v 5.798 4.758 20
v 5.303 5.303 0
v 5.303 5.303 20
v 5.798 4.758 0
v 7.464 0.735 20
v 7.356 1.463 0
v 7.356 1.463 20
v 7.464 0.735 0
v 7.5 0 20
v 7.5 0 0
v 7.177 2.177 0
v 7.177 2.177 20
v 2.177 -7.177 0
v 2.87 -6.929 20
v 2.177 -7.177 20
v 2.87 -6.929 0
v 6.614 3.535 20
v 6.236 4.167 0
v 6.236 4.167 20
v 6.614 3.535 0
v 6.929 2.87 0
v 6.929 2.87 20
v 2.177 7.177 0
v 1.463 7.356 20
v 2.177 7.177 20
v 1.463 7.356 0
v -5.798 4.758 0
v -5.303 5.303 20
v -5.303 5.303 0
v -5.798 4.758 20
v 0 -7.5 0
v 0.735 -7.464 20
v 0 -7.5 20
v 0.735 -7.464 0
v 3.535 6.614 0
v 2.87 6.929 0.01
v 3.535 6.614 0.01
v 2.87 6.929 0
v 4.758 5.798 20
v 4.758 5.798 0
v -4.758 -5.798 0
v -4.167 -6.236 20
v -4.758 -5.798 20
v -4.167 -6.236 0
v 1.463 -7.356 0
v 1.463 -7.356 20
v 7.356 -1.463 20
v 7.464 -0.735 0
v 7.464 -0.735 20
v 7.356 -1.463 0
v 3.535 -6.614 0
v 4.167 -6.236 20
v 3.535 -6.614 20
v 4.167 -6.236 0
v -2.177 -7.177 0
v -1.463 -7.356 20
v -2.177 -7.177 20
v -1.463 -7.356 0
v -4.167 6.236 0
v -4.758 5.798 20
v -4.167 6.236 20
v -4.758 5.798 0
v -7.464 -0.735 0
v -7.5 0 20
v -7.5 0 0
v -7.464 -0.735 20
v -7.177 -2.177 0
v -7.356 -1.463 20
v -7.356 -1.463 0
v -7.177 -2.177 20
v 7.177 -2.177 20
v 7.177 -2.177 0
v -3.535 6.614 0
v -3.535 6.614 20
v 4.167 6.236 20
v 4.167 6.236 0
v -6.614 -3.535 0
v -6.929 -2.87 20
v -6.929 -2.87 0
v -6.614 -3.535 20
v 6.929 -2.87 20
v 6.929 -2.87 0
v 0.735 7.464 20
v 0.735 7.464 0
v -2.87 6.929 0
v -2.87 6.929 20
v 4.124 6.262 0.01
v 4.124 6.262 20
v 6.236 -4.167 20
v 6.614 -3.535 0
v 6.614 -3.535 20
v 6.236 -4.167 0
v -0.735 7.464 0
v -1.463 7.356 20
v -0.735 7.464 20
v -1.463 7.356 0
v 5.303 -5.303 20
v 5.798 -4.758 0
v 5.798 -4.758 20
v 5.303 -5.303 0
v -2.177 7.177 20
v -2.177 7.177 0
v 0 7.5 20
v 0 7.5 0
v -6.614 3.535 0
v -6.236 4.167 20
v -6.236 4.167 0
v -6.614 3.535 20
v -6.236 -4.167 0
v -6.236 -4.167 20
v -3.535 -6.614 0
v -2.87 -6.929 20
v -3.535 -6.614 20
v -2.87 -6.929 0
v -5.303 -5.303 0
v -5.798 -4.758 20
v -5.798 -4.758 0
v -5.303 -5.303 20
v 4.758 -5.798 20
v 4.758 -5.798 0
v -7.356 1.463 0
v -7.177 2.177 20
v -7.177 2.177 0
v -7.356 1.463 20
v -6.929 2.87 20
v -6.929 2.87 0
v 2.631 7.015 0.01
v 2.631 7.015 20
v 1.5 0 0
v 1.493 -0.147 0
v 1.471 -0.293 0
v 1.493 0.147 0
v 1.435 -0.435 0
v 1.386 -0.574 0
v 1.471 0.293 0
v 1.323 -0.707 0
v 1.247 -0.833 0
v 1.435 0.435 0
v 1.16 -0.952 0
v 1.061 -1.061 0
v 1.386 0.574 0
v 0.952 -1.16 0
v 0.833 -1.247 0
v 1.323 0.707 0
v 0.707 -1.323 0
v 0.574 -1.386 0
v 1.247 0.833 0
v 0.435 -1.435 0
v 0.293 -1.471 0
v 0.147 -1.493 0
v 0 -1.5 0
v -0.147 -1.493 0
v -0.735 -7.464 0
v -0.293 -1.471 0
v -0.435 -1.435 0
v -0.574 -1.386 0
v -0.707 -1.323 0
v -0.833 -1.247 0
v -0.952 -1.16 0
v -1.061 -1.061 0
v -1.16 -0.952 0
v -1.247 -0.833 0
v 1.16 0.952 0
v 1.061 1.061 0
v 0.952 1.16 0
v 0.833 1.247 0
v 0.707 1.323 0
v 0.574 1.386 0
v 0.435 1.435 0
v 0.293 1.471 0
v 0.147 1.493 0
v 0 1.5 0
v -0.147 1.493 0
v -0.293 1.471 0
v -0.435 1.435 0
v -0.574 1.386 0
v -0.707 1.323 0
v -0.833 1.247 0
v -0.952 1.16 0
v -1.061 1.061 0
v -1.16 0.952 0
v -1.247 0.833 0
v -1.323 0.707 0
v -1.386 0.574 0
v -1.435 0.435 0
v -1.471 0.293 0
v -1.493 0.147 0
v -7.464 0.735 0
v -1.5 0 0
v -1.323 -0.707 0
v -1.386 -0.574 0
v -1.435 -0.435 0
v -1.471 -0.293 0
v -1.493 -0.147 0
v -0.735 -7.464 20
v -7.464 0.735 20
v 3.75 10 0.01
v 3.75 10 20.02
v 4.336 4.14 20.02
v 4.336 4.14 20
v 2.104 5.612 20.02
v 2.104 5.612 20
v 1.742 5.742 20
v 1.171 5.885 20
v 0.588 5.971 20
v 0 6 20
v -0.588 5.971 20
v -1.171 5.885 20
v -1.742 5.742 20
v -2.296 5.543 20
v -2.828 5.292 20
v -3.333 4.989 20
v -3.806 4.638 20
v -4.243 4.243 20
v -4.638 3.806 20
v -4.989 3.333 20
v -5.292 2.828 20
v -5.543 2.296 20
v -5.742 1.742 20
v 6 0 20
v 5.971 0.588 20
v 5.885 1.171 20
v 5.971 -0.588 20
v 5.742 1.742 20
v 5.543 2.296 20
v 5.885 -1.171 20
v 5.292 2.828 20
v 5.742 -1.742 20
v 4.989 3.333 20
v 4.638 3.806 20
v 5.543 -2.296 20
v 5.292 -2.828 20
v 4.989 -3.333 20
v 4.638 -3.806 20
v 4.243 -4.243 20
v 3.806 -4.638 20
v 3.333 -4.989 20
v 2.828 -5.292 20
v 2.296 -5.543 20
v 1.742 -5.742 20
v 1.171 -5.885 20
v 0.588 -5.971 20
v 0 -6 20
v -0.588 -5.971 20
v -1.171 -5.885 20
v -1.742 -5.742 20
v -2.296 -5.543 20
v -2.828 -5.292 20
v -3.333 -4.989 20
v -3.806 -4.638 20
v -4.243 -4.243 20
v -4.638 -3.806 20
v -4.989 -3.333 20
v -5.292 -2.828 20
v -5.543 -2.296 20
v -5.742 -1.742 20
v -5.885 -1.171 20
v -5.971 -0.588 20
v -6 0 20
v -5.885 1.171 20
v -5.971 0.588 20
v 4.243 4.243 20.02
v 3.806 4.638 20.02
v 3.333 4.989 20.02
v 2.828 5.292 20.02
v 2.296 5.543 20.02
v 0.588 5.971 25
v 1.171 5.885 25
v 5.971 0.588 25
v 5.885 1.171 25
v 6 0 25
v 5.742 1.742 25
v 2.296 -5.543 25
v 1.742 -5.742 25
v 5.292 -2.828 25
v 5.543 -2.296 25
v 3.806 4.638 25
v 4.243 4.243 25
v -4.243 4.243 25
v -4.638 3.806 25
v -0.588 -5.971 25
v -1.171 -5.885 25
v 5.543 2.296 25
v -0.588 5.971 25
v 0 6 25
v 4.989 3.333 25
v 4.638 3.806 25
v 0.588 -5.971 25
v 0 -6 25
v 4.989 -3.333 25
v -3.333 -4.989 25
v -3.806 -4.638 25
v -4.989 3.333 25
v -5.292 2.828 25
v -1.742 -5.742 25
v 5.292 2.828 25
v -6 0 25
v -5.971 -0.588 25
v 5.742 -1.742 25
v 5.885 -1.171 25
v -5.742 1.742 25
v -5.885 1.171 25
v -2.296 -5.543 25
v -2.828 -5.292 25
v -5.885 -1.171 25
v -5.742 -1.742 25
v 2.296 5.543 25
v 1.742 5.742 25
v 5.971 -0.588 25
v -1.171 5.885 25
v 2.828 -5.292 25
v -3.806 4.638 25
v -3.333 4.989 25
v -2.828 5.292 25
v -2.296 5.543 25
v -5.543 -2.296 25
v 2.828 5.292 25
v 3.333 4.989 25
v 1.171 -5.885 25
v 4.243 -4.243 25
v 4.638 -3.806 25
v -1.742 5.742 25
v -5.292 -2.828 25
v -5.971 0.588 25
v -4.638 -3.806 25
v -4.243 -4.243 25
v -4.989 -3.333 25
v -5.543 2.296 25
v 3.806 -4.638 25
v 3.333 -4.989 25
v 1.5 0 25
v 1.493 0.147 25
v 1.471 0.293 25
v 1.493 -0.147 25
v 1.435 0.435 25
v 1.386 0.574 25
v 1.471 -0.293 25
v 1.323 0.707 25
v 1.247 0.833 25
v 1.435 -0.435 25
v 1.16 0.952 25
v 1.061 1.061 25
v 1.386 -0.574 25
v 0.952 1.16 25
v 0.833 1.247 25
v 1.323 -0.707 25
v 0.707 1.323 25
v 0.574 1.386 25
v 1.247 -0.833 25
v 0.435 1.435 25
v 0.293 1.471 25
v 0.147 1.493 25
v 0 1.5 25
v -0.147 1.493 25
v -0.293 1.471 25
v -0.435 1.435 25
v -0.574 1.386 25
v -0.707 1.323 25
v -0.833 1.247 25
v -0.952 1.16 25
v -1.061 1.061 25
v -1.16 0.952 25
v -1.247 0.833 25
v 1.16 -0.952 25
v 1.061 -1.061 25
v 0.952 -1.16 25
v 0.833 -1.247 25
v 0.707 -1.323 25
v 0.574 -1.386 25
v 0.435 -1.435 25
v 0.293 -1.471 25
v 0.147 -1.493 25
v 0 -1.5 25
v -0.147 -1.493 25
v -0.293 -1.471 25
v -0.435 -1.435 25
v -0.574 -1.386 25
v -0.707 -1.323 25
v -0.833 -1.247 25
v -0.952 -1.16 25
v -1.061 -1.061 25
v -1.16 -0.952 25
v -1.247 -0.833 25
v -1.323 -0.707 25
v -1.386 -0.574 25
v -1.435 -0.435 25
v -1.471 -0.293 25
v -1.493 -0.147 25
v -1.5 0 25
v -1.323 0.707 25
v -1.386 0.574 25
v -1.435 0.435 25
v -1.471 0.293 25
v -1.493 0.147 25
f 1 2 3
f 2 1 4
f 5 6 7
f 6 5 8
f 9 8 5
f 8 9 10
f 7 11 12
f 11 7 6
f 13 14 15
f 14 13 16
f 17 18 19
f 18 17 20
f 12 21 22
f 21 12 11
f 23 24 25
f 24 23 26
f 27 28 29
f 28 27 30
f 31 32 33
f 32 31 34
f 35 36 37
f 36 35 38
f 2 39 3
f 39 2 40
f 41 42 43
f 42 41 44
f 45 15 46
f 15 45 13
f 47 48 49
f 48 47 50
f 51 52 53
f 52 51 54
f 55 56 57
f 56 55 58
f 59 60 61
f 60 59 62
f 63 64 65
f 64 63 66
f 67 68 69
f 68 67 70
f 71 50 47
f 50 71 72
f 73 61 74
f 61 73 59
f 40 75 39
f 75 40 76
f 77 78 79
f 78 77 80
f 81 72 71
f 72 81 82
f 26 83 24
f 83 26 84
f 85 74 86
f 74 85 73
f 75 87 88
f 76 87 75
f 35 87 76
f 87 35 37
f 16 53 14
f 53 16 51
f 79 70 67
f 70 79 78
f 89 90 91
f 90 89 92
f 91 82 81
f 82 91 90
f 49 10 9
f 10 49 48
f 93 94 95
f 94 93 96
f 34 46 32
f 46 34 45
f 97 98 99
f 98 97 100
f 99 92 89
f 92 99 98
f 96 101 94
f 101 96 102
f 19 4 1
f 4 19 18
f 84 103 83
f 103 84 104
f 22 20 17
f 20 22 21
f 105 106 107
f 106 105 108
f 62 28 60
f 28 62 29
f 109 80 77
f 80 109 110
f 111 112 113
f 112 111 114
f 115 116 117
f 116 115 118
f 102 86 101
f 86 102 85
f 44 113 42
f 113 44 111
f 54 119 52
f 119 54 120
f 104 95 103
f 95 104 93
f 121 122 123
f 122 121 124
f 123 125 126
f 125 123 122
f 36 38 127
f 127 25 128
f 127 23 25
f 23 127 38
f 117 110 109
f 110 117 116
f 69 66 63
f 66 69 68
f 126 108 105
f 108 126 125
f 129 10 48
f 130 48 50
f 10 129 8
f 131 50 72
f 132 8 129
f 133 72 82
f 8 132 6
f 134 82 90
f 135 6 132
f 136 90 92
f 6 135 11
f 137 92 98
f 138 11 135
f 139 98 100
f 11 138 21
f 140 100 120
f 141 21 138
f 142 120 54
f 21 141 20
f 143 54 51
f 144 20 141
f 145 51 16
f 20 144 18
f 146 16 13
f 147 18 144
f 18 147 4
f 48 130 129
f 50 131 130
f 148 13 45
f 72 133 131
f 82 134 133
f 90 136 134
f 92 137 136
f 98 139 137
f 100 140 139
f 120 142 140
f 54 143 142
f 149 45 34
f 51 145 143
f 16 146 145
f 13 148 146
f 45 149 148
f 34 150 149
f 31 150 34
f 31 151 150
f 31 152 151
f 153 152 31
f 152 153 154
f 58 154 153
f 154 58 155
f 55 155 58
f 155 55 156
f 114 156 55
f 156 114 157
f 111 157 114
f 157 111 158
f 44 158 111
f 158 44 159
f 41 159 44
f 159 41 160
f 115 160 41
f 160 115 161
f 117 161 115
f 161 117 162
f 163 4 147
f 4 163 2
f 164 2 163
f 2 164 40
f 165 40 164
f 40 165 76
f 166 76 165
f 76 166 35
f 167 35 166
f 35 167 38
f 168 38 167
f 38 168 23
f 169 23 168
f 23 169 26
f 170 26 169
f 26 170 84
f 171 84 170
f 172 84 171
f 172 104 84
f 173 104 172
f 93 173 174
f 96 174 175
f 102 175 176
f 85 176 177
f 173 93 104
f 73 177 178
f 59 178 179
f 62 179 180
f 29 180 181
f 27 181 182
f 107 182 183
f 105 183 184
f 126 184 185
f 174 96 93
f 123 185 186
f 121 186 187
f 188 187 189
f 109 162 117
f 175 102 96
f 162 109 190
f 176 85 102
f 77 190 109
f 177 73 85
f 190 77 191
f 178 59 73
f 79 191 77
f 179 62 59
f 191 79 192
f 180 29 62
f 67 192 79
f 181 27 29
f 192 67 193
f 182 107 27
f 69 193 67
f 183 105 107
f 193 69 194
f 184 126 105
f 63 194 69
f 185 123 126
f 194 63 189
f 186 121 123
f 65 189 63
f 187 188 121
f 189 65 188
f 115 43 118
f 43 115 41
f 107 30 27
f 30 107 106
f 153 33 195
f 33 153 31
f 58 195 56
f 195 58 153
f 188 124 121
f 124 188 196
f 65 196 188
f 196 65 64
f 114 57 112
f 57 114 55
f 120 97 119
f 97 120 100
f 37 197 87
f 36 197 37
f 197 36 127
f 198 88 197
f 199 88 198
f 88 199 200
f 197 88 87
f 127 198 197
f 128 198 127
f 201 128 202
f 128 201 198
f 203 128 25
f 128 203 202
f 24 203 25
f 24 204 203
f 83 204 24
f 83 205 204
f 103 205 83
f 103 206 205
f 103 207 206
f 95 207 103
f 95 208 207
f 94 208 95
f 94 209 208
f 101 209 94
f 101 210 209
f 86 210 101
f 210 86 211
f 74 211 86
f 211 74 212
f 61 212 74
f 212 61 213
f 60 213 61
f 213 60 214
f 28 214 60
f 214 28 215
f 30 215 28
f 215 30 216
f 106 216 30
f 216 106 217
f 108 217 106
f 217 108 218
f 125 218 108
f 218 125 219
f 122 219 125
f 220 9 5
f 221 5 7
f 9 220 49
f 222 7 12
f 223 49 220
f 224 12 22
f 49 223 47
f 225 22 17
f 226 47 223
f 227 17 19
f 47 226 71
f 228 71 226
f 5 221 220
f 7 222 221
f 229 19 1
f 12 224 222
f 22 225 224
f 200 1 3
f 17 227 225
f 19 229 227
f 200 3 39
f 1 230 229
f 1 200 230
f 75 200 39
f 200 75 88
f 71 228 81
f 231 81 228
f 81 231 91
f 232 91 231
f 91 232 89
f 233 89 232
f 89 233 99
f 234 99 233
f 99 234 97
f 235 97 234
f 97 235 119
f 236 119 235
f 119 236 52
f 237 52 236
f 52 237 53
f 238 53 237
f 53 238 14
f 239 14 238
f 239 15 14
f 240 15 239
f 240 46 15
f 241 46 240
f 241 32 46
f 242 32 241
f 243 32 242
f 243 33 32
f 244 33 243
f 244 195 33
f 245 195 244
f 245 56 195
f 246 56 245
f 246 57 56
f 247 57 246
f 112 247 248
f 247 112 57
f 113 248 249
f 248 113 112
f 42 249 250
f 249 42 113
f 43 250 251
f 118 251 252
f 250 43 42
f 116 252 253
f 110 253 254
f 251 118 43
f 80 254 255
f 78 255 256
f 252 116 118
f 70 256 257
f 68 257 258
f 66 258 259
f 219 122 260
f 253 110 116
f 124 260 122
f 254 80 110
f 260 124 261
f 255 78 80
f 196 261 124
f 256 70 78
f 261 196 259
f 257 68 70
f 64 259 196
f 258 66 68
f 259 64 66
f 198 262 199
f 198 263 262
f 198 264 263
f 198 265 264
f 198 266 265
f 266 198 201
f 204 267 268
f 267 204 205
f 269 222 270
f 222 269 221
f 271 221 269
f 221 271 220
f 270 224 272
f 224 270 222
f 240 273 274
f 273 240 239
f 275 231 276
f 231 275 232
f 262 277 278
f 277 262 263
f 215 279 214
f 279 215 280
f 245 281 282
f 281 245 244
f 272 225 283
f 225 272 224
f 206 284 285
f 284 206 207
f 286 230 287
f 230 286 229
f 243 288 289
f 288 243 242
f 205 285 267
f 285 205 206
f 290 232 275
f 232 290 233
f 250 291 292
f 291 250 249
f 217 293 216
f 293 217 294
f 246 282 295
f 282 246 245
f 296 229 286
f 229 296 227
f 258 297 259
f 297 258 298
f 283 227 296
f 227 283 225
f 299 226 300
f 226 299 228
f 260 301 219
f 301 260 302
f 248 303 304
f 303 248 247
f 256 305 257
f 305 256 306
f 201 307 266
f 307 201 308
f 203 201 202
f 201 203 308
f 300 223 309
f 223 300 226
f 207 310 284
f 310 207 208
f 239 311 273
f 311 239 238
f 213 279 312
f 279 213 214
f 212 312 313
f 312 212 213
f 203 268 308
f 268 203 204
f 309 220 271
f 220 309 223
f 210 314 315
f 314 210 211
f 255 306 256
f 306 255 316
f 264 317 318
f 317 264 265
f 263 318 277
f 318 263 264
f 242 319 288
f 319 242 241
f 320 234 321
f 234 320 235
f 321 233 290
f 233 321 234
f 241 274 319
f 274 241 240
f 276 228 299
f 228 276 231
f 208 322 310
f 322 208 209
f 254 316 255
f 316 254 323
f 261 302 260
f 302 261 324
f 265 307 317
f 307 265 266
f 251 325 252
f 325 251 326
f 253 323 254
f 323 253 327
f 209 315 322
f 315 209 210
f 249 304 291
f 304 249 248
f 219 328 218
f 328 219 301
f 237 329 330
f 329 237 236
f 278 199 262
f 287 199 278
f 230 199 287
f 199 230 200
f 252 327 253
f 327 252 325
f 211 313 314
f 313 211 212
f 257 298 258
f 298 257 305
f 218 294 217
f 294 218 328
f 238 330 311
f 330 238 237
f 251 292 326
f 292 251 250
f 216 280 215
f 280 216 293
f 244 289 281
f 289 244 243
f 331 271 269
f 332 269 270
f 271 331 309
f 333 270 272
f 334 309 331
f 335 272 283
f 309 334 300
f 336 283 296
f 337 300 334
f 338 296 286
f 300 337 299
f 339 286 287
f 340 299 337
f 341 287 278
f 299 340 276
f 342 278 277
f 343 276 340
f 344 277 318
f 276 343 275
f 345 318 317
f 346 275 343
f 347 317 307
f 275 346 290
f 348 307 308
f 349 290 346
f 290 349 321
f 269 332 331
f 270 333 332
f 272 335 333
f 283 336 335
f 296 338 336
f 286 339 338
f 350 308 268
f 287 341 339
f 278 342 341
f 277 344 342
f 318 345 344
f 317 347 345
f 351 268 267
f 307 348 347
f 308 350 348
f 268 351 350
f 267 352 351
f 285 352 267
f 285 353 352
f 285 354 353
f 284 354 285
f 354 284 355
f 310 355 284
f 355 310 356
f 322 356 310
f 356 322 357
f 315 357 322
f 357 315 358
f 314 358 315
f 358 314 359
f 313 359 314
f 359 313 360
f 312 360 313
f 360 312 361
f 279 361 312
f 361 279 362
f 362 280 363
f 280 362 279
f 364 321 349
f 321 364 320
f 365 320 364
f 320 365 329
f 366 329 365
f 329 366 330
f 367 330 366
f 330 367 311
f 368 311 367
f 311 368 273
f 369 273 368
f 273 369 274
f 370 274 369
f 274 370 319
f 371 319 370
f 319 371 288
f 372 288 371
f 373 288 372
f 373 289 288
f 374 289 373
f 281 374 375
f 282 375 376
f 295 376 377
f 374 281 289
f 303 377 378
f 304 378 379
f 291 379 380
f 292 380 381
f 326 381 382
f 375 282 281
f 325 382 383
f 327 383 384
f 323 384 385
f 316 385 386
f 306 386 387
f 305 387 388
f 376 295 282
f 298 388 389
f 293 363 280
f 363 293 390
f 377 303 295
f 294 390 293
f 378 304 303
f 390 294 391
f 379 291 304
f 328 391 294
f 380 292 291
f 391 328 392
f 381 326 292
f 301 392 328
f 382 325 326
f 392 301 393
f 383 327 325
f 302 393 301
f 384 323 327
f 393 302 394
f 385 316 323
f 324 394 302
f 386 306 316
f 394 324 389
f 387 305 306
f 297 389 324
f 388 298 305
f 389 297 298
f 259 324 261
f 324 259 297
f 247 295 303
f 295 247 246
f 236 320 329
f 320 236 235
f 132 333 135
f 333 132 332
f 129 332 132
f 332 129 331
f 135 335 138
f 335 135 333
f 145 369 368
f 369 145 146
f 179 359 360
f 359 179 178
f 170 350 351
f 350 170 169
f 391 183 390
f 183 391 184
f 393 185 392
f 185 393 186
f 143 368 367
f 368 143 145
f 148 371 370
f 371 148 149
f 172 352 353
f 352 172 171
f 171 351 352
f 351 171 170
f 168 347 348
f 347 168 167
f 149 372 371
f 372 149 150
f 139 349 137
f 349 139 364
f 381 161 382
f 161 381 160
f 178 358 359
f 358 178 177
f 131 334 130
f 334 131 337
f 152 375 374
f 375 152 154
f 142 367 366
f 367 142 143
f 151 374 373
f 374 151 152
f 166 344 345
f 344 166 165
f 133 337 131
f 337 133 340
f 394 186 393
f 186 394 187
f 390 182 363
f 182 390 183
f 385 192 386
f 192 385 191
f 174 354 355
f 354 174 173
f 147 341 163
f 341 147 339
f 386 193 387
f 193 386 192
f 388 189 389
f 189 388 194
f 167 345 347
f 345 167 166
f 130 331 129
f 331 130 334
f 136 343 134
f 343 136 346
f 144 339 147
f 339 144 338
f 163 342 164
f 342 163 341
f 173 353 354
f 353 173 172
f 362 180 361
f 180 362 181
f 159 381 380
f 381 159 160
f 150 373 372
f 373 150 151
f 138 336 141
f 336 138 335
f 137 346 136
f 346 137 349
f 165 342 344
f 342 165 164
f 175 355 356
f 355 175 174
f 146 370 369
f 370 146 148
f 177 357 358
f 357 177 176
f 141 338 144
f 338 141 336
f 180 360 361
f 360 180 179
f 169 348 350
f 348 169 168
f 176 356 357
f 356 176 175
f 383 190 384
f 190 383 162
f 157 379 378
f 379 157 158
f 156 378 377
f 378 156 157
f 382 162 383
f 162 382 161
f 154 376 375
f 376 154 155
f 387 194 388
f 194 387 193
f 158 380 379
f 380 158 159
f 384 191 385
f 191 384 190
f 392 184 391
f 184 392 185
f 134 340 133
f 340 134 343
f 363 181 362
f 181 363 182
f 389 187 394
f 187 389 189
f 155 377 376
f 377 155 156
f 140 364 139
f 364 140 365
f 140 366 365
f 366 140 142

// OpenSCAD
// Hose-barb reducer: 8 mm tubing side (z = 0..20) + collar (z = 20..25)
// Print orientation: standing upright along Z, as specified

// ---------------- Parameters ----------------
// Tubing 8 mm: barbs from z = 0 to z = 20
// Tubing 5 mm: barbs from z = 25 to z = 41 (not included in this file)
// Collar:      z = 20 to z = 25
// Bore:        3 mm, full length

// Tubing 8 mm barbs
$fn = 64;
barb_h_8     = 10;   // barb height
od_8_bottom  = 7.5;  // outer diameter at bottom of barb
od_8_top     = 9.5;  // outer diameter at top of barb
barb_count_8 = 2;    // number of barbs for 8 mm tubing
barb_d0_8    = 7.5;  // diameter where sawtooth returns (bottom)

// Tubing 5 mm barbs
od_5_bottom  = 6.5;  // outer diameter at bottom of barb
od_5_top     = 5.0;  // outer diameter at top of barb
barb_count_5 = 2;    // number of barbs for 5 mm tubing
barb_d0_5    = 6.5;  // diameter where sawtooth returns (bottom)

// Collar
od_collar    = 12;   // collar diameter
z_collar_top = 25;   // top of collar (also top of first barb set)

// Bore
bore_d       = 3;    // through-bore diameter

// ---------------- Model ----------------
difference() {
    union() {
        // 8 mm tubing barbs (z = 0 to 20)
        for (i = [0 : barb_count_8 - 1]) {
            translate([0, 0, i * barb_h_8])
                cylinder(h = barb_h_8, r = od_8_bottom);
            translate([0, 0, i * barb_h_8 + 0.01])
                linear_extrude(height = barb_h_8 + 0.01)
                    polygon([
                        [0, 0],
                        [od_8_bottom / 2, barb_h_8],
                        [od_8_top / 2, 0]
                    ]);
        }

        // Collar (z = 20 to 25)
        translate([0, 0, z_collar_top - 5])
            cylinder(h = 5, r = od_collar / 2);
    }

    // Through bore (extends past all faces)
    translate([0, 0, -1])
        cylinder(h = 42 + 2, r = bore_d / 2);
}
